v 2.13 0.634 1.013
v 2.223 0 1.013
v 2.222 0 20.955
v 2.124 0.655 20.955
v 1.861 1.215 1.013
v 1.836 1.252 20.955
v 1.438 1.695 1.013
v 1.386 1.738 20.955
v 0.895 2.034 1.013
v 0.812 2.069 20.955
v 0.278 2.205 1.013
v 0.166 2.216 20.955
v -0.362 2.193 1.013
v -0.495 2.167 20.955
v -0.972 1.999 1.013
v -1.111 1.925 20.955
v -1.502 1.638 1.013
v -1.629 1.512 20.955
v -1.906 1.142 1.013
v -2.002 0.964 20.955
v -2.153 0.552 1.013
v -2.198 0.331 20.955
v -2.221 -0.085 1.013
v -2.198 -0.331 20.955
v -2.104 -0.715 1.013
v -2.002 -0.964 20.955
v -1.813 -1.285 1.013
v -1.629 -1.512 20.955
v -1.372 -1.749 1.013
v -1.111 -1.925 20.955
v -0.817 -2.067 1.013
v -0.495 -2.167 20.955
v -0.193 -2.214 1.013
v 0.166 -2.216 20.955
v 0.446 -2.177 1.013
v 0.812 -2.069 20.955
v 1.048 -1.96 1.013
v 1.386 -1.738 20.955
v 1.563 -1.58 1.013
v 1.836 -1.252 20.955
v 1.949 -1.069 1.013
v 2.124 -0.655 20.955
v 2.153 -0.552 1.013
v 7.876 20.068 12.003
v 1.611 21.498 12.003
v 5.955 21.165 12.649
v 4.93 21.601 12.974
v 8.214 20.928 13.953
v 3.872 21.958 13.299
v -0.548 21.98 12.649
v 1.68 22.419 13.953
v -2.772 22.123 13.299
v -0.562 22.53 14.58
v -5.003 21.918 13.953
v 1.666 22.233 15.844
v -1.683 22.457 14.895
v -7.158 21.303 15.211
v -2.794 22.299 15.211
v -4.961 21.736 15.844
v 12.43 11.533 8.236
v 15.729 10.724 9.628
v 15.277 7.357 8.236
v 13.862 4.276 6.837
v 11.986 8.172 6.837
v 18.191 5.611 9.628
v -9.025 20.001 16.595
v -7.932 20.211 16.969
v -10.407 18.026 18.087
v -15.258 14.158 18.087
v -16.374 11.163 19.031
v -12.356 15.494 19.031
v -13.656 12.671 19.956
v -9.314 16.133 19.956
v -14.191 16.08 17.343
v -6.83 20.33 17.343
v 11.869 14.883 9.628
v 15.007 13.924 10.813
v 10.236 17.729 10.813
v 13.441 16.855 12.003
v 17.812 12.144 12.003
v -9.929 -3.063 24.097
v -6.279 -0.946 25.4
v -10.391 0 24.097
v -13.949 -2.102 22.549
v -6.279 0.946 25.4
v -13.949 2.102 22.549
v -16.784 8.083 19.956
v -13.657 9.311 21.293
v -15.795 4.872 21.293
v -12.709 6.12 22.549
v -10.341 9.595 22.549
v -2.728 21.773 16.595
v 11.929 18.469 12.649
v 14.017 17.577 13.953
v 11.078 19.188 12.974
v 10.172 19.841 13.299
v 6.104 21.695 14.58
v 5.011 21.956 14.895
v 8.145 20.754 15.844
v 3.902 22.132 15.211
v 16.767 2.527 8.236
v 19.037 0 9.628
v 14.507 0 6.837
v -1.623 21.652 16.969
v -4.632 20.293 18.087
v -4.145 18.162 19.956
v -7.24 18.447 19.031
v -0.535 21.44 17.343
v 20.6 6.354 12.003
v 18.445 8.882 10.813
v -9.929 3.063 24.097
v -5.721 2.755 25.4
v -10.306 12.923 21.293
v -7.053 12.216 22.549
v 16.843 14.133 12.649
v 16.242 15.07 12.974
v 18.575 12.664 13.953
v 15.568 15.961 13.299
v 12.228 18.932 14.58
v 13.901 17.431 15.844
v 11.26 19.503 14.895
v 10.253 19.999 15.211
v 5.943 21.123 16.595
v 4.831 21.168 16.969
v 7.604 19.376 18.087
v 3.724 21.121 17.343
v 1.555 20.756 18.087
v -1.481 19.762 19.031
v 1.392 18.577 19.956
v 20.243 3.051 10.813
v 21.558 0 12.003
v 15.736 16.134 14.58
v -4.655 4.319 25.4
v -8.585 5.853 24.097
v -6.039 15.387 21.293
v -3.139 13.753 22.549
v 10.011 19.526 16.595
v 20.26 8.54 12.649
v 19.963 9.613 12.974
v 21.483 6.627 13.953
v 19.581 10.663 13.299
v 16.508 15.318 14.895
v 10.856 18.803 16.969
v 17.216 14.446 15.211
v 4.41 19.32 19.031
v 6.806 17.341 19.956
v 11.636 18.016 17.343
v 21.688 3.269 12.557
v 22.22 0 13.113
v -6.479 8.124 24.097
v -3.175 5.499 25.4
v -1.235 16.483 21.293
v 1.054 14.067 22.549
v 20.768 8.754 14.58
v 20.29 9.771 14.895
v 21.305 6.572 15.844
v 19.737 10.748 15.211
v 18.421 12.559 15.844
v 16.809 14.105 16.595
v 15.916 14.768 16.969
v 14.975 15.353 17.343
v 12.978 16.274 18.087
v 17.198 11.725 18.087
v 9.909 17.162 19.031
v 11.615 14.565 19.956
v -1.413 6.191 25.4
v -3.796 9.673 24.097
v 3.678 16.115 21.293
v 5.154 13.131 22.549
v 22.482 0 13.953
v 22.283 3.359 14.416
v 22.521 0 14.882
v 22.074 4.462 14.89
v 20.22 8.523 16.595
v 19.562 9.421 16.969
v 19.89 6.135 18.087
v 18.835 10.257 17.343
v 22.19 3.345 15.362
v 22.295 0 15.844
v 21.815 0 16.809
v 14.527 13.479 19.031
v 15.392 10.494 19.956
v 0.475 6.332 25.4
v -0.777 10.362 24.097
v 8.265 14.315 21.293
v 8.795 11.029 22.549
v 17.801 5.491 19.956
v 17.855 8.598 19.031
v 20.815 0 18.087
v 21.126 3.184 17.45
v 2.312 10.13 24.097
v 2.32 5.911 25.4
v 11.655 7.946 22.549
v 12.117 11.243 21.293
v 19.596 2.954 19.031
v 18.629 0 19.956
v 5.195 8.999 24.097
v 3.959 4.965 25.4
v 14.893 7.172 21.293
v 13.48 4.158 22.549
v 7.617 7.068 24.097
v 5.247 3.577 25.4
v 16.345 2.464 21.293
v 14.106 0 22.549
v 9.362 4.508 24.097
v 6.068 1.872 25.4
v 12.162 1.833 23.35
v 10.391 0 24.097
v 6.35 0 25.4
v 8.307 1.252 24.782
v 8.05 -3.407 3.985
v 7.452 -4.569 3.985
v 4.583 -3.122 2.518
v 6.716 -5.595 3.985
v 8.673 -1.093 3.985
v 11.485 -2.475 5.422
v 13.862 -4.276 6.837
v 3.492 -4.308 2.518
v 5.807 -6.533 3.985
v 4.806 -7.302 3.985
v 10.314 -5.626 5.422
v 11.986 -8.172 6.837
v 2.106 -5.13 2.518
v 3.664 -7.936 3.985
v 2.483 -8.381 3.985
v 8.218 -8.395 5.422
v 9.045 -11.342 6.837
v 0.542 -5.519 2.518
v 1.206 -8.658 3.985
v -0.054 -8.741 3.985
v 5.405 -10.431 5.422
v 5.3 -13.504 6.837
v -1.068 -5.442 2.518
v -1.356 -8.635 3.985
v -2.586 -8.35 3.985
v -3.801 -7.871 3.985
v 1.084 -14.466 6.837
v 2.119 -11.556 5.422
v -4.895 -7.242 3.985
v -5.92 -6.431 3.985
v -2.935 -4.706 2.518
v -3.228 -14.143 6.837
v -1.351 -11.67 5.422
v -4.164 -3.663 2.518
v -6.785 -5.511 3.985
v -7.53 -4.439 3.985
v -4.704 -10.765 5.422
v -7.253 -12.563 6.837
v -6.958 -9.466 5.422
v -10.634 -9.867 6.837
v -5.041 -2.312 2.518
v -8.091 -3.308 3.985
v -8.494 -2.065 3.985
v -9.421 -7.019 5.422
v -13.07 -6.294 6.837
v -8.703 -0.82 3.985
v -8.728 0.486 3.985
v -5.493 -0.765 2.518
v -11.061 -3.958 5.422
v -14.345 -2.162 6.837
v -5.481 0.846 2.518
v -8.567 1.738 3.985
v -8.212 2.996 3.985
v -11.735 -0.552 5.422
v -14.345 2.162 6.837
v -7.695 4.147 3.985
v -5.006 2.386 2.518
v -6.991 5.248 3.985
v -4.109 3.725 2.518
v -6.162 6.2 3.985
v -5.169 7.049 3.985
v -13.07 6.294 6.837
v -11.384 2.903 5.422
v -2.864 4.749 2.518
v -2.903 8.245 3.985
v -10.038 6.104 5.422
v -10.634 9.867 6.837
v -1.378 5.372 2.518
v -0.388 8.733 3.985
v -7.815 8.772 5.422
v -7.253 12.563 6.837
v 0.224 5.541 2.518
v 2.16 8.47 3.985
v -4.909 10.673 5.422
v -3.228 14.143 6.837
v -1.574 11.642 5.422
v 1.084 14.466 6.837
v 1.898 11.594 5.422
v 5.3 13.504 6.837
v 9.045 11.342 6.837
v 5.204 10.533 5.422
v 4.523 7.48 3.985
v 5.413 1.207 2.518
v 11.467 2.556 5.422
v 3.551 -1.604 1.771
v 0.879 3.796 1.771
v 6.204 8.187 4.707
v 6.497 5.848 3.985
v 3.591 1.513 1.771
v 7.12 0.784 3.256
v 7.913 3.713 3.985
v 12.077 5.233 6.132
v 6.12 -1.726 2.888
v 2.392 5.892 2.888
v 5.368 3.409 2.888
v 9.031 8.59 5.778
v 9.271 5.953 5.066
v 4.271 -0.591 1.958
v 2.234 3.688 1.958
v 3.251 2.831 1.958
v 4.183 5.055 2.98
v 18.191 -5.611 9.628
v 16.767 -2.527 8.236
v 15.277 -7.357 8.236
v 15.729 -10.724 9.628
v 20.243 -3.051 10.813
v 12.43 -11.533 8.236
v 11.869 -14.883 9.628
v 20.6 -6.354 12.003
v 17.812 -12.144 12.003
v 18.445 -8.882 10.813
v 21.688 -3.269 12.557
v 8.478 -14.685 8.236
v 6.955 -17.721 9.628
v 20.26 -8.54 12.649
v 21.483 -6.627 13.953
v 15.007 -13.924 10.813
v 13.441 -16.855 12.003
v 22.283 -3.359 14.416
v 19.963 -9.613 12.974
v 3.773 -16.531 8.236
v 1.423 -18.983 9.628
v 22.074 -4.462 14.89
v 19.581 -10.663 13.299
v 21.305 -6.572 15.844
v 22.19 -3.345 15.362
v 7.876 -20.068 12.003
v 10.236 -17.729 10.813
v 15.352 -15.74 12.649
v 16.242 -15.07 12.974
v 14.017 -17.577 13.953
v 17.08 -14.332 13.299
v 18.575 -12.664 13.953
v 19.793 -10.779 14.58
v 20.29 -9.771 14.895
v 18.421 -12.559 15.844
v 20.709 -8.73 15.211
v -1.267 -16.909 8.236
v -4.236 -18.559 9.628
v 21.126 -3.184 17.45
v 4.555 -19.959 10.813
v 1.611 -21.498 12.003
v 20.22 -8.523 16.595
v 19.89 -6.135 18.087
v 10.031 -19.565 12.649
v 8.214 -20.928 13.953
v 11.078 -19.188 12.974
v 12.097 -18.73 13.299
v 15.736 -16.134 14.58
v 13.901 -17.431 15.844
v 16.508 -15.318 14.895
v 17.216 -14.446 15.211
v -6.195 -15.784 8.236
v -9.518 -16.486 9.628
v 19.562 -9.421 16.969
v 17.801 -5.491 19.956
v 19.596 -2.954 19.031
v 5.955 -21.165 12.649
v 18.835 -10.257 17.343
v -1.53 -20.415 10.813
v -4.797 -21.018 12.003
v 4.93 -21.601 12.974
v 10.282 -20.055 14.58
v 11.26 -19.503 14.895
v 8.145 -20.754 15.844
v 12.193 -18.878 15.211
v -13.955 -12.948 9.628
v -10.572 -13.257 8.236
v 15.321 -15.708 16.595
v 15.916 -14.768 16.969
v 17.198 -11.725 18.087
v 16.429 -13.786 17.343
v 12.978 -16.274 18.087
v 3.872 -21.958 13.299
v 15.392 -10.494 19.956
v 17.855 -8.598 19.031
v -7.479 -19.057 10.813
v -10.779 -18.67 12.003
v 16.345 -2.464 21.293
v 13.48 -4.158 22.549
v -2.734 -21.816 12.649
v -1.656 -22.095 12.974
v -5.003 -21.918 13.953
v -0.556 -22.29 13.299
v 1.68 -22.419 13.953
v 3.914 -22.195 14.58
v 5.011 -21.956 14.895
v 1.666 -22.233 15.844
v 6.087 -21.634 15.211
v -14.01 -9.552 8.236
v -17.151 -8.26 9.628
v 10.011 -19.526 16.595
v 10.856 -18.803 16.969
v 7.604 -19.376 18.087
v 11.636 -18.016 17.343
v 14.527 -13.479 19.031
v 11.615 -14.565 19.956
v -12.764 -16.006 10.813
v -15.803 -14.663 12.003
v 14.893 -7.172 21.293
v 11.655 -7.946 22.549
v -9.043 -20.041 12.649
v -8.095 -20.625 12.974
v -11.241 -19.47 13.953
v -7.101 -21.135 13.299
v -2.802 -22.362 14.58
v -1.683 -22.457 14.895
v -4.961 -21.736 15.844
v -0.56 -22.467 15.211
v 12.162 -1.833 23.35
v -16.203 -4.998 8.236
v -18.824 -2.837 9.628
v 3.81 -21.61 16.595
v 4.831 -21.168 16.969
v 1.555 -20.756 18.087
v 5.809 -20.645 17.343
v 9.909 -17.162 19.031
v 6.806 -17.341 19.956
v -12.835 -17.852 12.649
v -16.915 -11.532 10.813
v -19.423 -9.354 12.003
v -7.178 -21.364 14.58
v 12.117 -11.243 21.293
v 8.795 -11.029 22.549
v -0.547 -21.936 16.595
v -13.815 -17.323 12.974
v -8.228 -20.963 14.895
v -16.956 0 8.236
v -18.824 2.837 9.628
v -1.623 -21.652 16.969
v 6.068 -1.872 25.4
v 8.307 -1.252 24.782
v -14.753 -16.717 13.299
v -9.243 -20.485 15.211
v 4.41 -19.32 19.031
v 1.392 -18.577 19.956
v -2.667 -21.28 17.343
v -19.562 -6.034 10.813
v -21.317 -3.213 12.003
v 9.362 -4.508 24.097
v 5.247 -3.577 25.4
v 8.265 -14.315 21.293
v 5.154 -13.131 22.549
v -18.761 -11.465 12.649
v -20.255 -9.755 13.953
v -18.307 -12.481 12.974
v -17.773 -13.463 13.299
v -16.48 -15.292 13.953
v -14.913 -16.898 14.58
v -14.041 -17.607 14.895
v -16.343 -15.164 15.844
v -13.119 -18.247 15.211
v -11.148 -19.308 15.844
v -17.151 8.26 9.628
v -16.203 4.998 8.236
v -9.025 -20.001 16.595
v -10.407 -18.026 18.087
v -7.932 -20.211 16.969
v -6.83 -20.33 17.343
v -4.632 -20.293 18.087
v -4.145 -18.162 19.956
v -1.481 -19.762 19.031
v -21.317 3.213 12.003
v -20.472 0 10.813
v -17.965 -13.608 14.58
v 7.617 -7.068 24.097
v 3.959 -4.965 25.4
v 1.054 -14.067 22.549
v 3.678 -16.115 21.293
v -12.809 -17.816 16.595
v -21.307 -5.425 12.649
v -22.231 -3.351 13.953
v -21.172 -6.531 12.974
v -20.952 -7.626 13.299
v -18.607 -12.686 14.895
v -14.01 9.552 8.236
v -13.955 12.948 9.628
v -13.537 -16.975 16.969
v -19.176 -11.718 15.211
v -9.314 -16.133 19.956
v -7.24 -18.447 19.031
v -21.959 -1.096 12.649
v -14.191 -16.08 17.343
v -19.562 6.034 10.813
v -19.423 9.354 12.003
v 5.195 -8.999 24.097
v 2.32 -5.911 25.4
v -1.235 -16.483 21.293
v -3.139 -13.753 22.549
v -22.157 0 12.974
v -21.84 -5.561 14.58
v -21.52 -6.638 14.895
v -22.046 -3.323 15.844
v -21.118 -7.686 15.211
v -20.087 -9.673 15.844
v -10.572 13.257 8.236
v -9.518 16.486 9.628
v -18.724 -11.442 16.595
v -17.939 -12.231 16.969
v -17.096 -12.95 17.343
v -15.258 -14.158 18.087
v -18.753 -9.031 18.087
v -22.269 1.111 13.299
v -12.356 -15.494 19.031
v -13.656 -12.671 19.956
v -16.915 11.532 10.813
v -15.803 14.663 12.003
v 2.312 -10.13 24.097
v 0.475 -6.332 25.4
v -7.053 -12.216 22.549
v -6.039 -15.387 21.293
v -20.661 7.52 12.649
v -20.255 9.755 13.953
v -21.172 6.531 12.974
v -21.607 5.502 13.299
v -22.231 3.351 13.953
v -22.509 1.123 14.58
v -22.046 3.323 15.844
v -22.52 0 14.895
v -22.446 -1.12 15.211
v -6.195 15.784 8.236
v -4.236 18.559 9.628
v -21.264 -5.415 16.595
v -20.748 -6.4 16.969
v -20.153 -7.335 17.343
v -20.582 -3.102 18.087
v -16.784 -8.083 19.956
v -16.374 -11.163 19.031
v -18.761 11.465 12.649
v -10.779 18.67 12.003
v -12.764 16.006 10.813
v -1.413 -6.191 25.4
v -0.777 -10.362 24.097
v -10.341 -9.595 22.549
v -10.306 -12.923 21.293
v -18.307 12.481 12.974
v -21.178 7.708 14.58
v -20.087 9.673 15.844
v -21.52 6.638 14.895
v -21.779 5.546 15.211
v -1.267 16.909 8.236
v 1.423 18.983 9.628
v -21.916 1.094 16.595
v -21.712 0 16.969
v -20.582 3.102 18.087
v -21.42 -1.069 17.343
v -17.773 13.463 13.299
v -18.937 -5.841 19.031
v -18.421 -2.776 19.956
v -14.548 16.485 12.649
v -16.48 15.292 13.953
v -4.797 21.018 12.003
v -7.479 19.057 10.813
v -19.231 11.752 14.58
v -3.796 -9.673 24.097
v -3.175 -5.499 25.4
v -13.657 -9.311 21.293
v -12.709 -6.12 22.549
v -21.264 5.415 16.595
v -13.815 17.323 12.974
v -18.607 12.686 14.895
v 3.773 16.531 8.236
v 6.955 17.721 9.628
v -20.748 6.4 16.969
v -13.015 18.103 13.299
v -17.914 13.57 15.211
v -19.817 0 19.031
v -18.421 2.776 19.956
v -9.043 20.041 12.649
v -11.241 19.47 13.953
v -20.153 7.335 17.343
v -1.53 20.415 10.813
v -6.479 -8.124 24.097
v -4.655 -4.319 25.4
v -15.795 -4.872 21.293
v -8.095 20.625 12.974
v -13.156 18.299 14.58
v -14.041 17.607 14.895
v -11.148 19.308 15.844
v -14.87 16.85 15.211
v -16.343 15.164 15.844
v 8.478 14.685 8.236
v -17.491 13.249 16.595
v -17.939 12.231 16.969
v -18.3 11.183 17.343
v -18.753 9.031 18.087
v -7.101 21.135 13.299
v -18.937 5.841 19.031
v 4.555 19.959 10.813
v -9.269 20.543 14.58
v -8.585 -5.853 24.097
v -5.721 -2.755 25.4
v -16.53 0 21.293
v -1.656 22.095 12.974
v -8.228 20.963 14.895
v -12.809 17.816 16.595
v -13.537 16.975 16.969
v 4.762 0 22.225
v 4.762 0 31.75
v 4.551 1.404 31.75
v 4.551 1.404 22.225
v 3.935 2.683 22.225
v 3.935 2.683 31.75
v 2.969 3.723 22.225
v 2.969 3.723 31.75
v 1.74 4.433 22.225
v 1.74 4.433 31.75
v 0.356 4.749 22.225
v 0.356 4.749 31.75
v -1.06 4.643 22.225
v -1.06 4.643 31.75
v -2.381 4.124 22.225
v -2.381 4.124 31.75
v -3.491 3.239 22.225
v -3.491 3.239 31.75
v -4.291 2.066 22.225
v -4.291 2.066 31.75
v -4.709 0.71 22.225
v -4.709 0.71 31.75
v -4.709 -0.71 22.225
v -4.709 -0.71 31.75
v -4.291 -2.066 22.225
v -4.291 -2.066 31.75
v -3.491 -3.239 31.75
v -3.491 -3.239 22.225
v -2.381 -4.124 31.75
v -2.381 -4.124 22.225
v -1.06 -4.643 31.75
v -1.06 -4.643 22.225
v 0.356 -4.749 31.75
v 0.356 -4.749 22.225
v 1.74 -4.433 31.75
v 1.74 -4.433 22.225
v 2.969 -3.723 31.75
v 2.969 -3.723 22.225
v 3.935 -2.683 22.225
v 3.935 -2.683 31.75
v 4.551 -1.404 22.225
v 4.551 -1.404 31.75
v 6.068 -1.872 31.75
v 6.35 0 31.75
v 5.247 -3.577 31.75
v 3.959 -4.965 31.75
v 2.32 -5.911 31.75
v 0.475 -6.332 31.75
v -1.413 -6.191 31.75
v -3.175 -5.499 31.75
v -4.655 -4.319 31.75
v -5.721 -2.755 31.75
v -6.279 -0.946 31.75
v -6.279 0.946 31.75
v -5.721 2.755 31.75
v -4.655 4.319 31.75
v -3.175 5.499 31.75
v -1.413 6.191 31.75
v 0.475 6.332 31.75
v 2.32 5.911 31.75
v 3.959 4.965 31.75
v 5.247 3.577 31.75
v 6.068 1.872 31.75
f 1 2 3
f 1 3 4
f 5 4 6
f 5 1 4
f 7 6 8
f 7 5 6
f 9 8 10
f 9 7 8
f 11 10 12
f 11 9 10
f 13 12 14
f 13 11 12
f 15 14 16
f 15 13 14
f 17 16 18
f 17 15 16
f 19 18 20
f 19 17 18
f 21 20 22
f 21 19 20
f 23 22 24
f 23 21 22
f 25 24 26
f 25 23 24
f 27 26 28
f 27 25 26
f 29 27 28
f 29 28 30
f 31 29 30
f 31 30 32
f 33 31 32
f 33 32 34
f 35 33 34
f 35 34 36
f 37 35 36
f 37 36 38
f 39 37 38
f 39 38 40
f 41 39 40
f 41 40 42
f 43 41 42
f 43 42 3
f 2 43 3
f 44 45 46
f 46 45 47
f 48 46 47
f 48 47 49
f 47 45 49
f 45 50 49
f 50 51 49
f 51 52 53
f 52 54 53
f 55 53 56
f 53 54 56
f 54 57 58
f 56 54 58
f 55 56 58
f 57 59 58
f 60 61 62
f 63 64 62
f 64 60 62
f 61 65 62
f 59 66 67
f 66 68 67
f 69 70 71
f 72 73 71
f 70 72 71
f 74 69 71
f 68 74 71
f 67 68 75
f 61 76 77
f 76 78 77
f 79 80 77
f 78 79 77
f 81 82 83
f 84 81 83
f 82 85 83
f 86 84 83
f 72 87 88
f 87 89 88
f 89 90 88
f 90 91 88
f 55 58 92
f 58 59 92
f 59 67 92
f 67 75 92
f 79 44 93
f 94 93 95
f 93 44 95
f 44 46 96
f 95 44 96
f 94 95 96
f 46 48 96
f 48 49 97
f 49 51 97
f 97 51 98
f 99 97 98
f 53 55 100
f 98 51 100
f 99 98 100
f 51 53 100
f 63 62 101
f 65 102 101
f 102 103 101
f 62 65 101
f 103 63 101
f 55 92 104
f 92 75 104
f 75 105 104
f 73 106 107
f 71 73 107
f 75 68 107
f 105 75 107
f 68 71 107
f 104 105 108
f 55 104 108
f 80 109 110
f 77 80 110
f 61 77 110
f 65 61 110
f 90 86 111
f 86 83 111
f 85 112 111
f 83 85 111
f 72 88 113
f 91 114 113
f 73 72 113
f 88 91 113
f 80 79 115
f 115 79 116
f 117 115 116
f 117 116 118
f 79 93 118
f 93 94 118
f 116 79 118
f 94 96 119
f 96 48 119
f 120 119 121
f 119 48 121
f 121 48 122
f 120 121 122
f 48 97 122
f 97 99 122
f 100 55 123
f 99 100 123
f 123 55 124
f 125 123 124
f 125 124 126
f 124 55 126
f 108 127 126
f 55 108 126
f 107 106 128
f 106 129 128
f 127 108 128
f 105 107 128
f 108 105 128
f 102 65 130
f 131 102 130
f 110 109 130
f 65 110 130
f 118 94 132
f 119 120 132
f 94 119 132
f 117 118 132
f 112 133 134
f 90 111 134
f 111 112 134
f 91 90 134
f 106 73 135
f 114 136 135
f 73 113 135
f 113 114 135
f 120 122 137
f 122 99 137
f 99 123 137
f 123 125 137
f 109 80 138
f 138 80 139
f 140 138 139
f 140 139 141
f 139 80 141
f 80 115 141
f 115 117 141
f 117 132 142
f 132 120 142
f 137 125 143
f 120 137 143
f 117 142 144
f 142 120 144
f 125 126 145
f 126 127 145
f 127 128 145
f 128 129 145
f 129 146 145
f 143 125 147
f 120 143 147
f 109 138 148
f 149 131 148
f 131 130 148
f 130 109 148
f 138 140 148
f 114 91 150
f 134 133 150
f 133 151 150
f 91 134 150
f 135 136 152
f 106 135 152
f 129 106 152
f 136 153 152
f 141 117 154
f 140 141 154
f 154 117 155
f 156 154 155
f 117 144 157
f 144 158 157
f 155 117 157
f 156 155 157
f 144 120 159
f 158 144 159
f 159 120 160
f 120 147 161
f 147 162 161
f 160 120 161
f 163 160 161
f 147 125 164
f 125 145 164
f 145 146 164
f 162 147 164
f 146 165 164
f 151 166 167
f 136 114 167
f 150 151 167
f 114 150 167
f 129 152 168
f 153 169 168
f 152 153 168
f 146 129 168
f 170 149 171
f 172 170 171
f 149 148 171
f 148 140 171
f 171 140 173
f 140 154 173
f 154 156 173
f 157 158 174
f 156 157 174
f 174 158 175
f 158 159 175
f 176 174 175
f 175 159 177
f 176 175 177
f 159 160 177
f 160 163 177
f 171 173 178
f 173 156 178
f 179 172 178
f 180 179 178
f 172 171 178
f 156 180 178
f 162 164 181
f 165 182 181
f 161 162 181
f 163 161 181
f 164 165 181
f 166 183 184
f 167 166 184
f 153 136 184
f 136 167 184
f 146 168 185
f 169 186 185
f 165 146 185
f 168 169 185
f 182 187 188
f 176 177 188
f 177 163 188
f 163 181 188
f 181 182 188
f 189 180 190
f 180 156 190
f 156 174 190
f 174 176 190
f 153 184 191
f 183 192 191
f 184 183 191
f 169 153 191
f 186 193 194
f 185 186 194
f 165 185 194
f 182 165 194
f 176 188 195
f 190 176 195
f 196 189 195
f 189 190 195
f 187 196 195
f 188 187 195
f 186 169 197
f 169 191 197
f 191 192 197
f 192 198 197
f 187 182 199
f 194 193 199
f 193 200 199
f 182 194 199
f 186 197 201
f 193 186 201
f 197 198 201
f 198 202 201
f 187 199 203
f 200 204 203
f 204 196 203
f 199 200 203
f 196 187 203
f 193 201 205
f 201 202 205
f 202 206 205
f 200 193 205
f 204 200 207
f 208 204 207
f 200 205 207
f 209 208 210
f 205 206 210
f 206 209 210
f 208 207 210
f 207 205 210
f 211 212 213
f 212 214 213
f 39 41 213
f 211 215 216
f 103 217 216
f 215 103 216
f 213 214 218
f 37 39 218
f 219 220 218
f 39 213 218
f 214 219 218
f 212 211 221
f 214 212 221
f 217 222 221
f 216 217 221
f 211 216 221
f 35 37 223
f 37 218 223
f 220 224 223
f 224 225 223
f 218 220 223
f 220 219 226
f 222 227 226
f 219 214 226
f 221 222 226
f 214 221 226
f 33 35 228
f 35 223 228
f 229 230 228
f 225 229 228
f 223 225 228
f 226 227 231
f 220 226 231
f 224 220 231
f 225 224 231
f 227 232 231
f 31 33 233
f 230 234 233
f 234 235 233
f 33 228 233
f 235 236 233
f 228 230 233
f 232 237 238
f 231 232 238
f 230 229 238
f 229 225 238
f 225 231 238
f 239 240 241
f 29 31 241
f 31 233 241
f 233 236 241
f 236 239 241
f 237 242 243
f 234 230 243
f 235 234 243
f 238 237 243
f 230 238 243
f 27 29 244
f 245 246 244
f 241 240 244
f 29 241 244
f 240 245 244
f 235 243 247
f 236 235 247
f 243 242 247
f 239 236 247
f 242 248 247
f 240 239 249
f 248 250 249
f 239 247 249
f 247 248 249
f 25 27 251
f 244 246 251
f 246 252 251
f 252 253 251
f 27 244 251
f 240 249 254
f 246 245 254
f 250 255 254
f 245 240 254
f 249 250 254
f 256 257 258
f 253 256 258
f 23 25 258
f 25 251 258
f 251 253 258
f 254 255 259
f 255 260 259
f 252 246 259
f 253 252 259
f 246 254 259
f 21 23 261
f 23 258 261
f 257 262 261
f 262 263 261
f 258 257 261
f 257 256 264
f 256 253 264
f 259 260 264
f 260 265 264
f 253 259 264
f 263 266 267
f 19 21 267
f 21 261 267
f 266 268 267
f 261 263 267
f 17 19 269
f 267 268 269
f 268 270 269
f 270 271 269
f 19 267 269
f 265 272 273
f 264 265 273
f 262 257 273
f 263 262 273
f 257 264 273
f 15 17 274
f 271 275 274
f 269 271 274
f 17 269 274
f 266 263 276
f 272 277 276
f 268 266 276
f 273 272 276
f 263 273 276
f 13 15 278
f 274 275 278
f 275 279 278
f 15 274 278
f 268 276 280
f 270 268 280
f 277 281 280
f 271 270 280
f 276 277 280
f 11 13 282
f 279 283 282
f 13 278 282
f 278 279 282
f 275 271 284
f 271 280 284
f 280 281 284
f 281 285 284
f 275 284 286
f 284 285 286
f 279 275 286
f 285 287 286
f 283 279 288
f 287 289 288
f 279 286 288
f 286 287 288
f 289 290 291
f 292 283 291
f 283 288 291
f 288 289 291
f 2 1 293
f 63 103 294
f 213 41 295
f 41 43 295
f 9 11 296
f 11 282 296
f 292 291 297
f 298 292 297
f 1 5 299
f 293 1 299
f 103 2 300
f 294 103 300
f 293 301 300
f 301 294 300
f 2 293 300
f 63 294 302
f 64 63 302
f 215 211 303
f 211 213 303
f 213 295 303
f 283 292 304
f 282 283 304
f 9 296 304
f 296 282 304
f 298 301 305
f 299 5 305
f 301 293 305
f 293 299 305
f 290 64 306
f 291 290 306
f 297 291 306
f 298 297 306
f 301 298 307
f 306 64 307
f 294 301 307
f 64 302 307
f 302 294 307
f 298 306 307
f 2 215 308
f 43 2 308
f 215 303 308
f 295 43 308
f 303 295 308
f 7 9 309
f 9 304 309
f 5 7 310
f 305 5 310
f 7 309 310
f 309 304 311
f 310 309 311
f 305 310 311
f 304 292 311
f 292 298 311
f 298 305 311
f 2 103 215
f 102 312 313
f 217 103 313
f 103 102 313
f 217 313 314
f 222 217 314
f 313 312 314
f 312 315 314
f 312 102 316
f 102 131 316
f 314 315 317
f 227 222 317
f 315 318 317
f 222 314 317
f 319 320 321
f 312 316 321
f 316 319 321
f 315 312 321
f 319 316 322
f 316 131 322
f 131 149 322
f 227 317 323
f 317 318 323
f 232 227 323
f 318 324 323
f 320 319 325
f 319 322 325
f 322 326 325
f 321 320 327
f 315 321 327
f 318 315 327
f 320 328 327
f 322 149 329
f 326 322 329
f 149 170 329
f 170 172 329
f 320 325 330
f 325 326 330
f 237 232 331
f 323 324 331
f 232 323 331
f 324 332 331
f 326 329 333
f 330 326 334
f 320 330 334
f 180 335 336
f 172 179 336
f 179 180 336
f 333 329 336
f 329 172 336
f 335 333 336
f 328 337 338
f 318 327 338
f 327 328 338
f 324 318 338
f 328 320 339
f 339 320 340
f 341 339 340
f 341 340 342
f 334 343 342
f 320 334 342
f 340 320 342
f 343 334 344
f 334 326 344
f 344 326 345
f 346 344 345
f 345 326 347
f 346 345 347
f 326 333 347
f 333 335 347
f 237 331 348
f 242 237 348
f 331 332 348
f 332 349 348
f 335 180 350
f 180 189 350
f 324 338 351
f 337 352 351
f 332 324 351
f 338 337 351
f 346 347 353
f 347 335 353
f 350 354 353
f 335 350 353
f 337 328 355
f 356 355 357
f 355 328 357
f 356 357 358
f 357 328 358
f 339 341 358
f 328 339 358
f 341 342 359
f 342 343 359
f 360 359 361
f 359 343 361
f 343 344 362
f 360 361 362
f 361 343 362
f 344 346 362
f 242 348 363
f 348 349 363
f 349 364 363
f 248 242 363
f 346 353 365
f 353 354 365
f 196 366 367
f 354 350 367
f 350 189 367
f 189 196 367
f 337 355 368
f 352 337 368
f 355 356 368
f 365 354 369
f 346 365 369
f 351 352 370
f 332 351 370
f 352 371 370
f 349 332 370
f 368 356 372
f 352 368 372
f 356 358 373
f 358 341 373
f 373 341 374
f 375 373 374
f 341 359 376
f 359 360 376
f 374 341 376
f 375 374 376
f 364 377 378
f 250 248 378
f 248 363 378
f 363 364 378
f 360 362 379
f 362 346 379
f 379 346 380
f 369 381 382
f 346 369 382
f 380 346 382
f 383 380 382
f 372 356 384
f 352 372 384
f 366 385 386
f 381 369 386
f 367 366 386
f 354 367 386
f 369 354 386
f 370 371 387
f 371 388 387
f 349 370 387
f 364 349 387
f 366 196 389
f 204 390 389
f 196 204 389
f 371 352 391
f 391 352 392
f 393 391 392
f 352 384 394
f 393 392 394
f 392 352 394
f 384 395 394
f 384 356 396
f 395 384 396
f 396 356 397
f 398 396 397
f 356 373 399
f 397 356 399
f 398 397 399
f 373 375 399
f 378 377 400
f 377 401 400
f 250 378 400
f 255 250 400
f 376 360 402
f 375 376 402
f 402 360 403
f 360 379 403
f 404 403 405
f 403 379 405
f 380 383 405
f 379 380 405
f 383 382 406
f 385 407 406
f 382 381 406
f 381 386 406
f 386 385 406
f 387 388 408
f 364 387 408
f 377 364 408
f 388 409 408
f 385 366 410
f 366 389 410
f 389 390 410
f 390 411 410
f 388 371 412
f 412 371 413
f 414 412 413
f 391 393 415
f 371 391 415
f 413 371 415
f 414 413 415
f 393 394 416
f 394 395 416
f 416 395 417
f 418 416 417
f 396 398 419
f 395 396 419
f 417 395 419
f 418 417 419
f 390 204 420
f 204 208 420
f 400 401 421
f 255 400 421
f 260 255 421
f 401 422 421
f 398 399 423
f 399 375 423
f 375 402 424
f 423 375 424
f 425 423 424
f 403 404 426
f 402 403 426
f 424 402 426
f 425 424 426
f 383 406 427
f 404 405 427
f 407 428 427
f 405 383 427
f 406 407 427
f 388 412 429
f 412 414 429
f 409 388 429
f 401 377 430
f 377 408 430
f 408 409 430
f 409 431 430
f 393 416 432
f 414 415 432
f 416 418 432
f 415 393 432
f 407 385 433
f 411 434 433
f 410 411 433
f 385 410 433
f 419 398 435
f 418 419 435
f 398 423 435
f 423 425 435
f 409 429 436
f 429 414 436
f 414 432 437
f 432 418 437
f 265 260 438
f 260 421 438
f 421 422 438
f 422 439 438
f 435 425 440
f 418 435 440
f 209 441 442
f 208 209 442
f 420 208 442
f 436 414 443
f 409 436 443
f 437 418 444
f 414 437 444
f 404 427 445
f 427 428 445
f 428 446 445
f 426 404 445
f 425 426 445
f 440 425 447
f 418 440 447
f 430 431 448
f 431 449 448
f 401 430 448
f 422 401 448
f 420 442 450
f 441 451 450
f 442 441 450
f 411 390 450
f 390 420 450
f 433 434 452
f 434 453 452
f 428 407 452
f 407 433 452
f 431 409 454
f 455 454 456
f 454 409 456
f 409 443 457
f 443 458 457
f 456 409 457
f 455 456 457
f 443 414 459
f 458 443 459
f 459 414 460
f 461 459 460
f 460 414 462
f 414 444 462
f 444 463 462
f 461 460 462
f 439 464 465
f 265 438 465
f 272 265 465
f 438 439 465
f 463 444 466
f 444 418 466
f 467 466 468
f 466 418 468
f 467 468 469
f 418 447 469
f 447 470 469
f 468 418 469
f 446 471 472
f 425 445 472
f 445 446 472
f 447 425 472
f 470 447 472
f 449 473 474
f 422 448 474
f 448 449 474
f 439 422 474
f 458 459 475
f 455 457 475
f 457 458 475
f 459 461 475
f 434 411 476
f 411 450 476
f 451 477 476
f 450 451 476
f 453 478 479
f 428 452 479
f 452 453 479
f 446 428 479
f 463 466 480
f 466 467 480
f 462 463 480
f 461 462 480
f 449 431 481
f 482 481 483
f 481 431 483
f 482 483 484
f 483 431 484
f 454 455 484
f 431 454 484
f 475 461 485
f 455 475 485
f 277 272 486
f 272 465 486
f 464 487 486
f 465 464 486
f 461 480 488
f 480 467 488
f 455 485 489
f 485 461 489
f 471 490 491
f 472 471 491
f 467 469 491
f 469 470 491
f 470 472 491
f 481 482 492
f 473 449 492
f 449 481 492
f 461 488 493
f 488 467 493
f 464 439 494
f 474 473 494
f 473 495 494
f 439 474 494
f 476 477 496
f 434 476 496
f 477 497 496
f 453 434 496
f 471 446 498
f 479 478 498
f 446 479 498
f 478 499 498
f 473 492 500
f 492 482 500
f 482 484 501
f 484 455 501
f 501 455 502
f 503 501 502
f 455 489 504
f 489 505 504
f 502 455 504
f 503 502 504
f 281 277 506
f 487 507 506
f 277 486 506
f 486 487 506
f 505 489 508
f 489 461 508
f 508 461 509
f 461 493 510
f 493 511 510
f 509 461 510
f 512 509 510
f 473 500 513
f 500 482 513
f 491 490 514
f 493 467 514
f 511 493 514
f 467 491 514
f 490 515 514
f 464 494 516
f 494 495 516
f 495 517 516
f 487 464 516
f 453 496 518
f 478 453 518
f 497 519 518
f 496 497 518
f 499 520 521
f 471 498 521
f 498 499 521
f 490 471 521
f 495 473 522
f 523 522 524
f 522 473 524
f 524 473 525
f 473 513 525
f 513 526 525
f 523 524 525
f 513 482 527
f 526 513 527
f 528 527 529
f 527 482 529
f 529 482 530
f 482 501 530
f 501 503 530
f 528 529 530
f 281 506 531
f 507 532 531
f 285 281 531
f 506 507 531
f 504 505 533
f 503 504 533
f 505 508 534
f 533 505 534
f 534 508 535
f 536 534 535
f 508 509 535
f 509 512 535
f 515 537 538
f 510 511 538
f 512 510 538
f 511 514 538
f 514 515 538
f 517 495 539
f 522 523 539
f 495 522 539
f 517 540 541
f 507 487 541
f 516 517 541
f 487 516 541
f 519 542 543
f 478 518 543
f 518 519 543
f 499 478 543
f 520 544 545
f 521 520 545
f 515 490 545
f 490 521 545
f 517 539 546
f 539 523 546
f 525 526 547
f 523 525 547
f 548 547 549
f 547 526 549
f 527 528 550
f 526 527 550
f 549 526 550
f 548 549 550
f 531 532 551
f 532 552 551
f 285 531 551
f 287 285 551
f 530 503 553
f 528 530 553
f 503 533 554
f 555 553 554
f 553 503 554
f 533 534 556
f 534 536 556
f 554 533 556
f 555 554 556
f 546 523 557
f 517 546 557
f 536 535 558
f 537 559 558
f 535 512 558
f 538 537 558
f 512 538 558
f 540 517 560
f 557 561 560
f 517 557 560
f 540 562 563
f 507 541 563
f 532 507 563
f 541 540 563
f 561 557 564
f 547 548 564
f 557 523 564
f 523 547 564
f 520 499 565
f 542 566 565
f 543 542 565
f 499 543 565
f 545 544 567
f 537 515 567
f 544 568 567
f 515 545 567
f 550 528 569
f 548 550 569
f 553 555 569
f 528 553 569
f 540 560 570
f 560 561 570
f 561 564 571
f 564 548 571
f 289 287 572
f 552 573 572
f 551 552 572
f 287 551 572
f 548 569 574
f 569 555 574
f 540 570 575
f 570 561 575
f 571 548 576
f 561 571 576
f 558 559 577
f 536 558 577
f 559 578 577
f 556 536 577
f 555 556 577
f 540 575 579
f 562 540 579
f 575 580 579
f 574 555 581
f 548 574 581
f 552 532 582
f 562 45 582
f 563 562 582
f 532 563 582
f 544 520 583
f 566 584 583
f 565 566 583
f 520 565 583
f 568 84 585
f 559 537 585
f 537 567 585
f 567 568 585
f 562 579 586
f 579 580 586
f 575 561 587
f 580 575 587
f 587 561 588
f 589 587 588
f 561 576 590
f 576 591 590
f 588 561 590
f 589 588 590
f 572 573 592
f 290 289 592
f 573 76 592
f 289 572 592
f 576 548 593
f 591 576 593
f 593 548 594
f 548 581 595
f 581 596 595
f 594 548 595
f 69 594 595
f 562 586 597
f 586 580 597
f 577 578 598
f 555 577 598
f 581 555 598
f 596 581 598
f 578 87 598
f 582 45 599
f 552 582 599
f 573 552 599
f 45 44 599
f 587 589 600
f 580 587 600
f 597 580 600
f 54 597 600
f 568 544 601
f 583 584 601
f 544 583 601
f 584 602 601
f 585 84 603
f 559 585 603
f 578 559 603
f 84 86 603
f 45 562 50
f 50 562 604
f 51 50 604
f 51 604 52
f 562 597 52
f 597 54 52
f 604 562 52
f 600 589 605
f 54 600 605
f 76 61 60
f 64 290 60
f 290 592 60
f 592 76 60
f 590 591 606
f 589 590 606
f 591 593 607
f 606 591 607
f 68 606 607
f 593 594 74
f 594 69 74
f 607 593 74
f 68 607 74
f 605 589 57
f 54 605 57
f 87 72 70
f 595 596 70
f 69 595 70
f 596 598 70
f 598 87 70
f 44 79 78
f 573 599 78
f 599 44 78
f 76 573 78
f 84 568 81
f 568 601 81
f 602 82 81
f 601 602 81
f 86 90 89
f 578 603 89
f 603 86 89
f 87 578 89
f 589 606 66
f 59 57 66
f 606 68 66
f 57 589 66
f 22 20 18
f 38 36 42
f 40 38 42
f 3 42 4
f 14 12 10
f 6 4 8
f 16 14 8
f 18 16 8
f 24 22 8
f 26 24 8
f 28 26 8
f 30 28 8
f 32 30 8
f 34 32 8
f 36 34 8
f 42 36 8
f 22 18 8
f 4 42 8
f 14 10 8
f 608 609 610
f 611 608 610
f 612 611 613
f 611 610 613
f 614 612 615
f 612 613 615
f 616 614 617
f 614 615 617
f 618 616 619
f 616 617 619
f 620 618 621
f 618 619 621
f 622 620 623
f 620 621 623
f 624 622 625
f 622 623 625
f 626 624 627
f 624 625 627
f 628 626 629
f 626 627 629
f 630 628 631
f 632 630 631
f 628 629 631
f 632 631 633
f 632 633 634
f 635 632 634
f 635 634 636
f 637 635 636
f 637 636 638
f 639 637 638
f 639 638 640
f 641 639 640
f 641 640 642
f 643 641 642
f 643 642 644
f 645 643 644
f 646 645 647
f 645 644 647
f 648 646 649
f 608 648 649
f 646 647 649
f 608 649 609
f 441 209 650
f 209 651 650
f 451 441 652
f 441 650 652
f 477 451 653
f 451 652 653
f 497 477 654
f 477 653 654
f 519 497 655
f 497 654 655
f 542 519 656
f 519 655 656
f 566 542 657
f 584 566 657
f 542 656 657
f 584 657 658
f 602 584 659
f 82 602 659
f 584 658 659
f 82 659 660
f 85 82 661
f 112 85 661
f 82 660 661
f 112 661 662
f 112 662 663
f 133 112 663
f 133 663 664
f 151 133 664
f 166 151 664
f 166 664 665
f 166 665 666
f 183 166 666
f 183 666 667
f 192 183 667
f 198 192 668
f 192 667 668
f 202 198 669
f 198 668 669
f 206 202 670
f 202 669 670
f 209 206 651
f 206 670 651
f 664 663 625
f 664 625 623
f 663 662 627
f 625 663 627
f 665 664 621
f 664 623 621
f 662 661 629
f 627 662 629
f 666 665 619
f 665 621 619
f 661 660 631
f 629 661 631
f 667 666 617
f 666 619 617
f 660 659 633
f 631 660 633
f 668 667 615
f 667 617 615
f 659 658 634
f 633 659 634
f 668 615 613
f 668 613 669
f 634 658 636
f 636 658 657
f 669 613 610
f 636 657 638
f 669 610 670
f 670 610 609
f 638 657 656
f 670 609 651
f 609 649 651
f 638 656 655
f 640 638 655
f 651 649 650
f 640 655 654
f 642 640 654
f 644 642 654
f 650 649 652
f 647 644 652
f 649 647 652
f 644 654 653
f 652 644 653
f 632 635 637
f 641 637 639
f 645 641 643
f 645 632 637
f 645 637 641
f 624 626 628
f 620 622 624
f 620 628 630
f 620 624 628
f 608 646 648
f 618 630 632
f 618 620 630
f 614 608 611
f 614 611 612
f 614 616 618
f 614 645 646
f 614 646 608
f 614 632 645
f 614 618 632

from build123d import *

# Parameters (mm, degrees)
F2_R     = 4.7625
F3_DEPTH = 9.525
F4_R     = 2.2225
F5_DEPTH = 20.955


with BuildPart() as f1:
    # F0 (on Front) → F1 (revolve)
    with BuildSketch(Plane.XZ):
        with BuildLine():
            Line((0, 31.75), (0, 0))
            add(Edge.make_bspline(
                [(0, 0), (11.3912708933, 5.2234637309), (31.6529425674, 13.3350349717), (15.0865243452, 22.9511441647), (6.35, 25.4)],
                knots=[0, 0, 0, 0, 0.5389896465, 1, 1, 1, 1], degree=3))
            Line((6.35, 25.4), (6.35, 31.75))
            Line((6.35, 31.75), (0, 31.75))
        make_face()
    revolve(axis=Axis((0, 0, 15.875), (0, 0, -1)))

    # F2 (on face) → F3 (cut)
    with BuildSketch(Plane.XY.offset(31.75)):
        Circle(F2_R)
    extrude(amount=-F3_DEPTH, mode=Mode.SUBTRACT)

    # F4 (on Top) → F5 (cut)
    with BuildSketch(Plane.XY):
        Circle(F4_R)
    extrude(amount=F5_DEPTH, mode=Mode.SUBTRACT)


solid = f1.part
